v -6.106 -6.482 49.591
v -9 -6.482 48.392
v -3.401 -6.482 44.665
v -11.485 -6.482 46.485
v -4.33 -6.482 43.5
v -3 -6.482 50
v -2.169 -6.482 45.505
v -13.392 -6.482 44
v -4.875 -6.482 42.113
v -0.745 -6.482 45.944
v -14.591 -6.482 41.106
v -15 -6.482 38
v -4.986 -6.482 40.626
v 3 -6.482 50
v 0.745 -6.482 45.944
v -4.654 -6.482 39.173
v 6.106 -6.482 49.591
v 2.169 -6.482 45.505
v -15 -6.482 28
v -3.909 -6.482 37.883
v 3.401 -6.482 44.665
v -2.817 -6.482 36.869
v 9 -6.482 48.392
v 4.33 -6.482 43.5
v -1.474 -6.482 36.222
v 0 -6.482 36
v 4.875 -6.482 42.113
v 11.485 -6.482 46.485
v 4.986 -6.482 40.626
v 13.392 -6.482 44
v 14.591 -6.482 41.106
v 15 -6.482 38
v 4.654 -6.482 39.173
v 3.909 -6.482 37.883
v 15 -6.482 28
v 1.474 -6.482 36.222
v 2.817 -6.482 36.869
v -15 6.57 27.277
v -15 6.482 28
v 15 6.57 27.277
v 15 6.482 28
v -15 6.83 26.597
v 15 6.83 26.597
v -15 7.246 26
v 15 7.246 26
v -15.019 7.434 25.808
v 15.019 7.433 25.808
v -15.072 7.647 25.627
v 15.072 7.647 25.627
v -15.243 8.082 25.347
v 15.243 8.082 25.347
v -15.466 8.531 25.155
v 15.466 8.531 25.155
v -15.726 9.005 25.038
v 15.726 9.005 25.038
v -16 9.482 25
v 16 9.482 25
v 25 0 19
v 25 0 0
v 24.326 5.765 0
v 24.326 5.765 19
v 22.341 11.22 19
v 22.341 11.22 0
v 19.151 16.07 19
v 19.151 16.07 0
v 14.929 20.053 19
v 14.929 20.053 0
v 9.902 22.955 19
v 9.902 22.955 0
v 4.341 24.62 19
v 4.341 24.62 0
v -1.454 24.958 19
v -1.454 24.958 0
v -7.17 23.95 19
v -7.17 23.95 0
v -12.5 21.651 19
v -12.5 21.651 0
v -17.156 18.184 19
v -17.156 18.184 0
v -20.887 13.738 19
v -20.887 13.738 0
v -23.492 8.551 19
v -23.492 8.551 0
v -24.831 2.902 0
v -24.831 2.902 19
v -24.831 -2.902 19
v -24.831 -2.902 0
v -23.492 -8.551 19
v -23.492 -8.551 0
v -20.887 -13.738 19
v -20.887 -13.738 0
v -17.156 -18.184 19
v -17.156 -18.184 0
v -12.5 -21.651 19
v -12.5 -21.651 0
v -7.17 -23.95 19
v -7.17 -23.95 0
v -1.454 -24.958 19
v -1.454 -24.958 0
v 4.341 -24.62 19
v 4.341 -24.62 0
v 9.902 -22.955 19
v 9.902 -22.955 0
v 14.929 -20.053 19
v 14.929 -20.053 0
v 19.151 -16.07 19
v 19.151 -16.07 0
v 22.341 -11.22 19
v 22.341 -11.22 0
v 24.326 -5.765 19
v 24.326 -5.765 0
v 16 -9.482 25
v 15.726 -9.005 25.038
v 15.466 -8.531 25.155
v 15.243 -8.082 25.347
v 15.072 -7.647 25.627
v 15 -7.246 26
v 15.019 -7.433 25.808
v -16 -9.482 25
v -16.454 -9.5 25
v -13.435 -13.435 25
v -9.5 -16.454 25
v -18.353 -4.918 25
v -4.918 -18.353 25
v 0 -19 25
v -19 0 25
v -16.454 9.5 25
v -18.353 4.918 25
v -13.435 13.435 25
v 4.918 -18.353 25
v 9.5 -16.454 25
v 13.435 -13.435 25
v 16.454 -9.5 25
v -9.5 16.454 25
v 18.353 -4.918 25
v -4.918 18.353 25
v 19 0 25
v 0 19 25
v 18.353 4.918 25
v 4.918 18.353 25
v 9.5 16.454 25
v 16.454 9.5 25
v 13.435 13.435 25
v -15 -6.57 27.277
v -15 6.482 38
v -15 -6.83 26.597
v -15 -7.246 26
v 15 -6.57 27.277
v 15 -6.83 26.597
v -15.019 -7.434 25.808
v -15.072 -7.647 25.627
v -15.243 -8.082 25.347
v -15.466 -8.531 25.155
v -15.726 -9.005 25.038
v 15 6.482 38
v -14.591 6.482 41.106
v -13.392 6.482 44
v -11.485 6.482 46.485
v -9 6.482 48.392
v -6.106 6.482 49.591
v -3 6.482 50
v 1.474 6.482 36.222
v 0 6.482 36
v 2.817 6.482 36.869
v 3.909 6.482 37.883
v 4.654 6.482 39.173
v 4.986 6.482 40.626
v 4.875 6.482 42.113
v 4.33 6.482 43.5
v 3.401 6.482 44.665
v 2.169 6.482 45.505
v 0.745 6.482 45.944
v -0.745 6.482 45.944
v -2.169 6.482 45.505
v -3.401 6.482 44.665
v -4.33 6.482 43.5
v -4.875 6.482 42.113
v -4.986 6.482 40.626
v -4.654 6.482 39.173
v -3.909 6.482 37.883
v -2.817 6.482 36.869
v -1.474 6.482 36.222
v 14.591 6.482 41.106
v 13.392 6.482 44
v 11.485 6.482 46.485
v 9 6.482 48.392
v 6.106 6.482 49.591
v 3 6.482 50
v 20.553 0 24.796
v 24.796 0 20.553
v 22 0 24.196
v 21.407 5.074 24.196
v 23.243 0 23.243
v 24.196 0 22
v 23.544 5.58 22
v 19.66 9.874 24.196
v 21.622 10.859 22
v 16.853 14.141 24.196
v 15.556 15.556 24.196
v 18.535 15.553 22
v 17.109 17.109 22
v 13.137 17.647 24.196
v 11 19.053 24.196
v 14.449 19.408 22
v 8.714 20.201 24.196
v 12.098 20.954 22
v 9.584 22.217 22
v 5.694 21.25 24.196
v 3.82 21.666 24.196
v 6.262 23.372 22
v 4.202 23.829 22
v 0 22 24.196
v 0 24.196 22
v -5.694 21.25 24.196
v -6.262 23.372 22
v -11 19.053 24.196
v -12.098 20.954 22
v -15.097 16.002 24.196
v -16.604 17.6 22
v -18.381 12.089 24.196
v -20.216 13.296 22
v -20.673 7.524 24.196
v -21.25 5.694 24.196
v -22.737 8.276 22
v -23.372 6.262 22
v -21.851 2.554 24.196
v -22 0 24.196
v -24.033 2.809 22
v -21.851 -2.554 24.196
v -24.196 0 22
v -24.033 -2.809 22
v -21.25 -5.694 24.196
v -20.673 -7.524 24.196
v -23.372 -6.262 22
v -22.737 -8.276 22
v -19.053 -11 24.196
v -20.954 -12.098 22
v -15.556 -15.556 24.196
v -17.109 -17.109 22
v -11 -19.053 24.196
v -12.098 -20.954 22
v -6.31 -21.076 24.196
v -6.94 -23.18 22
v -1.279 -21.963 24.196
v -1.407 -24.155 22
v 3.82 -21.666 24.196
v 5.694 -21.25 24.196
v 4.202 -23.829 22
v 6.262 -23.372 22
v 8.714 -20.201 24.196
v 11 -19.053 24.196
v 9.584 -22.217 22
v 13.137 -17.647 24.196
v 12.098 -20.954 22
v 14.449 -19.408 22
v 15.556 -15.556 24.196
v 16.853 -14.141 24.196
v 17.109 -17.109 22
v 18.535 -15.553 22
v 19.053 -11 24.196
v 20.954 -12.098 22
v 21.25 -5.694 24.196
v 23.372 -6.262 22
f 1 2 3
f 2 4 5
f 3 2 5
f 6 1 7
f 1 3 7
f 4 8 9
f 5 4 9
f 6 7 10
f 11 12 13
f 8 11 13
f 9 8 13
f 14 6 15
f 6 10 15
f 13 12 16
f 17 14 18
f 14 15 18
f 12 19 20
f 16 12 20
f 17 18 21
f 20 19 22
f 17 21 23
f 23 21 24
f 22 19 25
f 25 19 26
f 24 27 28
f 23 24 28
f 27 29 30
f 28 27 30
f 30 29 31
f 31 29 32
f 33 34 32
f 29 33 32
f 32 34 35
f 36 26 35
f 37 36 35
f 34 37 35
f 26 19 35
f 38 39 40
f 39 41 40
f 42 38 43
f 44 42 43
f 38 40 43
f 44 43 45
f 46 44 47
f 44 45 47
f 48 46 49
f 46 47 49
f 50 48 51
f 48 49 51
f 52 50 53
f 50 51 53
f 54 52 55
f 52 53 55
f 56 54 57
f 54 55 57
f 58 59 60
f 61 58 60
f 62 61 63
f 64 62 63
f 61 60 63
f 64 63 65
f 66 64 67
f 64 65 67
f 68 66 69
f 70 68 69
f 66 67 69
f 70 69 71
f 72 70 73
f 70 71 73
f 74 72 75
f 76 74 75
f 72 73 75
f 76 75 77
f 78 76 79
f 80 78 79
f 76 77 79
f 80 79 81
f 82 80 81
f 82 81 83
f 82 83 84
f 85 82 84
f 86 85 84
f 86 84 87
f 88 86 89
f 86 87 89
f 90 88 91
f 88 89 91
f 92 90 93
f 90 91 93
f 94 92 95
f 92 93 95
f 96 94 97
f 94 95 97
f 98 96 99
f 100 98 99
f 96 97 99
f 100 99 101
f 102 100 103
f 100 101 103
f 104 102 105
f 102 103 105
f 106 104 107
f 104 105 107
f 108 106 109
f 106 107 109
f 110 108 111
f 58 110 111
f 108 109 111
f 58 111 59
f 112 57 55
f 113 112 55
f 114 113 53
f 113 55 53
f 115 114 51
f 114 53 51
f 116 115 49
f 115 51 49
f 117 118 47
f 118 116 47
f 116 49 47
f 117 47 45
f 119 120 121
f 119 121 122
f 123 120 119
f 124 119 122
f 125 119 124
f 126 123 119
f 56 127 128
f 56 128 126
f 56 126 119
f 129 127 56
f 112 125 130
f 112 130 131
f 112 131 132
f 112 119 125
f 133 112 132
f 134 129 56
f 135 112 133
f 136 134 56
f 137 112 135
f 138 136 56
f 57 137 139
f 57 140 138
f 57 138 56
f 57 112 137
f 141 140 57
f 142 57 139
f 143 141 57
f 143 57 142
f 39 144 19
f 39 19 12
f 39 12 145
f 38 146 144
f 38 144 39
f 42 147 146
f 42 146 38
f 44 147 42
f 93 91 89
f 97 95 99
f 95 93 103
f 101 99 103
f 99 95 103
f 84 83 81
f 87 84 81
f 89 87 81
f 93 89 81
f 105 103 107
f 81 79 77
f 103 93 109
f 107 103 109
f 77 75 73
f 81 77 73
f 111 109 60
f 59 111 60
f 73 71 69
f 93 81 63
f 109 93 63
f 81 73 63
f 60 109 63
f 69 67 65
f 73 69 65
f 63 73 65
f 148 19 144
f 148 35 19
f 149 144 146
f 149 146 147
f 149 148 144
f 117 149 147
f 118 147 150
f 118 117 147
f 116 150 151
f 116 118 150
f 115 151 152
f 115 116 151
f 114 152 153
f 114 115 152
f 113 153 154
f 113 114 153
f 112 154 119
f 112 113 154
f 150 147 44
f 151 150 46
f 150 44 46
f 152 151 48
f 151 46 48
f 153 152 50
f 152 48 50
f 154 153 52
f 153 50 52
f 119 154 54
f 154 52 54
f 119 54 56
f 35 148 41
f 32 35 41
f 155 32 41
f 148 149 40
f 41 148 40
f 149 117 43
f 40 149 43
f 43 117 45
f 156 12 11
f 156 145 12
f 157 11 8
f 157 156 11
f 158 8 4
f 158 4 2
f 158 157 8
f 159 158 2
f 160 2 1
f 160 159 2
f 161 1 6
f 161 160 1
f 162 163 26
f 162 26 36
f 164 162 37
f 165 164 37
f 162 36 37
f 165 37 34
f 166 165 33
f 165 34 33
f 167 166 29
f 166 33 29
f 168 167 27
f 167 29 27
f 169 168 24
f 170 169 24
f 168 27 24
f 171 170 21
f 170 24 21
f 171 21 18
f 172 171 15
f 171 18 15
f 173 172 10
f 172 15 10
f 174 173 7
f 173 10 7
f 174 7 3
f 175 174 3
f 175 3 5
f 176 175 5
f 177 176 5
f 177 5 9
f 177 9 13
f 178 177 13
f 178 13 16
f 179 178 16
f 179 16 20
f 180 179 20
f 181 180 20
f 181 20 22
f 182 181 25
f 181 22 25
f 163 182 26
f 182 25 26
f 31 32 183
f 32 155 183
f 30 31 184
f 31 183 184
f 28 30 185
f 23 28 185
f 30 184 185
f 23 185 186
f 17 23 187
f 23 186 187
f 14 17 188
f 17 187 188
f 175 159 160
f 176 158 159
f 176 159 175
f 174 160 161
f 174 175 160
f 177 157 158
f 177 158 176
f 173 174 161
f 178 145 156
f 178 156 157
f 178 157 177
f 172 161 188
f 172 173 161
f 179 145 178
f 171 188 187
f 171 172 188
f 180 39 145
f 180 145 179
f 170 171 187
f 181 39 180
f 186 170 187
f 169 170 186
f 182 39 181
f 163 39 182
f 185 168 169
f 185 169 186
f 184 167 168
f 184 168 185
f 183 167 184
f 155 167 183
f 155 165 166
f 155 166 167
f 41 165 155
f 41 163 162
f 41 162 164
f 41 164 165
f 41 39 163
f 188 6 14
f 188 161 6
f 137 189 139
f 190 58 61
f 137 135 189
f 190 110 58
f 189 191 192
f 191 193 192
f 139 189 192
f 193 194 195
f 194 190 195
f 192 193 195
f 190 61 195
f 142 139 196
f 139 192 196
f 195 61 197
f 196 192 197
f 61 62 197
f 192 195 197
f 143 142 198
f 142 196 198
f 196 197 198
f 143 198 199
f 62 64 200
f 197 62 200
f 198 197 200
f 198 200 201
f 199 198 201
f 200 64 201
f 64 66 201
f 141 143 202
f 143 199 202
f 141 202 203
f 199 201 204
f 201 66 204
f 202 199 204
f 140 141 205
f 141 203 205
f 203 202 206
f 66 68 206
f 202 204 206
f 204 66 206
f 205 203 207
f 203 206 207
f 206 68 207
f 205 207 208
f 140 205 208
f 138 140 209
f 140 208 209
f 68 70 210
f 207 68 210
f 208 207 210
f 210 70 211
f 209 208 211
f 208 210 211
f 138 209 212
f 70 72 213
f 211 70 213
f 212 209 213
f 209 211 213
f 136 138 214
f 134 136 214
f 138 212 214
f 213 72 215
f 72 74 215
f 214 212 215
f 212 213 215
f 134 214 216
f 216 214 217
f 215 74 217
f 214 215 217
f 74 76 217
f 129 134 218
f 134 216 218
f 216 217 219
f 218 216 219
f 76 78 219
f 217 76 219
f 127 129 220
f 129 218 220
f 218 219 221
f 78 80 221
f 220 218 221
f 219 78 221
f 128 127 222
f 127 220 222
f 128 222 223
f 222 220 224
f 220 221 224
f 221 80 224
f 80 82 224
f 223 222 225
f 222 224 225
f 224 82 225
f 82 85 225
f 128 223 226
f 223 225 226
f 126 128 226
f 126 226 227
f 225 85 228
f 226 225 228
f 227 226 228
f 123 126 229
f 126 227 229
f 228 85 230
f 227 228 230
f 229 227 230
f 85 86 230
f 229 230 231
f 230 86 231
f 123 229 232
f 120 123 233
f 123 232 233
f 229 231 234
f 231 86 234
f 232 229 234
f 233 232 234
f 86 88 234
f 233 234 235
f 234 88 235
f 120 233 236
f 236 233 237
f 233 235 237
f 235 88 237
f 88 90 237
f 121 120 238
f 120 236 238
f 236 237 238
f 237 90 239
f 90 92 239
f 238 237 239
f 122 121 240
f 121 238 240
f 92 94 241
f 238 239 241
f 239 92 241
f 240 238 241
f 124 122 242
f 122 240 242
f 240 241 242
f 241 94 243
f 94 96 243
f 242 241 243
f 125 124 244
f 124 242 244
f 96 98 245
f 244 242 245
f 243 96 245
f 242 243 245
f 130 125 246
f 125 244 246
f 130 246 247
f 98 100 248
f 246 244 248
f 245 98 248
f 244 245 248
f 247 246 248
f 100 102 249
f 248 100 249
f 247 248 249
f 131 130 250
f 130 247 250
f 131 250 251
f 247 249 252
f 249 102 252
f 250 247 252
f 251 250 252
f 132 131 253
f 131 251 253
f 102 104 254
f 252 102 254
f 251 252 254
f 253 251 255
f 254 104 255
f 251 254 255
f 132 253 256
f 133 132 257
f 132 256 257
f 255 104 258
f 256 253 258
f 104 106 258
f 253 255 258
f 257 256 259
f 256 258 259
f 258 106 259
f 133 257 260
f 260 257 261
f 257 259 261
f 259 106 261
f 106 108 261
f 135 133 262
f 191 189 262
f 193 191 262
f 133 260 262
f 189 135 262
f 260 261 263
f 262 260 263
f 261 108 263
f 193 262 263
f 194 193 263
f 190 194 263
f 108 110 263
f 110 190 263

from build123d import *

# Parameters (mm, degrees)
SKETCH1_R           = 25
BOSS_EXTRUDE1_DEPTH = 25
SKETCH2_W           = 30
SKETCH2_H           = 12.964212382
BOSS_EXTRUDE2_DEPTH = 25
FILLET1_R           = 12
FILLET2_R           = 1
FILLET3_R           = 3
SKETCH3_R           = 5
CUT_EXTRUDE1_DEPTH  = 12.964212381
FILLET4_R           = 6


with BuildPart() as part:
    # Sketch1 → Boss-Extrude1 (new body)
    with BuildSketch(Plane.XY):
        Circle(SKETCH1_R)
    extrude(amount=BOSS_EXTRUDE1_DEPTH)

    # Sketch2 → Boss-Extrude2 (add)
    with BuildSketch(Plane.XY.offset(25)):
        Rectangle(SKETCH2_W, SKETCH2_H)
    extrude(amount=BOSS_EXTRUDE2_DEPTH)

    # Fillet1
    fillet1_edges = [part.edges().sort_by_distance(p)[0] for p in [
        (15, 0, 50),
        (-15, 0, 50),
    ]]
    fillet(fillet1_edges, radius=FILLET1_R)

    # Fillet2
    fillet2_edges = [part.edges().sort_by_distance(p)[0] for p in [
        (15, 0, 25),
        (-15, 0, 25),
    ]]
    fillet(fillet2_edges, radius=FILLET2_R)

    # Fillet3
    fillet3_edges = [part.edges().sort_by_distance(p)[0] for p in [
        (0, -6.482106191, 25),
    ]]
    fillet(fillet3_edges, radius=FILLET3_R)
    fillet3_2_edges = [part.edges().sort_by_distance(p)[0] for p in [
        (0, 6.482106191, 25),
    ]]
    fillet(fillet3_2_edges, radius=FILLET3_R)

    # Sketch3 → Cut-Extrude1 (cut)
    with BuildSketch(Plane.XZ.offset(6.482106191)):
        with Locations(Location((0, 41, 0), (0, 0, 270))):
            Circle(SKETCH3_R)
    extrude(amount=-CUT_EXTRUDE1_DEPTH, mode=Mode.SUBTRACT)

    # Fillet4
    fillet4_edges = [part.edges().sort_by_distance(p)[0] for p in [
        (-25, 0, 25),
    ]]
    fillet(fillet4_edges, radius=FILLET4_R)


solid = part.part
